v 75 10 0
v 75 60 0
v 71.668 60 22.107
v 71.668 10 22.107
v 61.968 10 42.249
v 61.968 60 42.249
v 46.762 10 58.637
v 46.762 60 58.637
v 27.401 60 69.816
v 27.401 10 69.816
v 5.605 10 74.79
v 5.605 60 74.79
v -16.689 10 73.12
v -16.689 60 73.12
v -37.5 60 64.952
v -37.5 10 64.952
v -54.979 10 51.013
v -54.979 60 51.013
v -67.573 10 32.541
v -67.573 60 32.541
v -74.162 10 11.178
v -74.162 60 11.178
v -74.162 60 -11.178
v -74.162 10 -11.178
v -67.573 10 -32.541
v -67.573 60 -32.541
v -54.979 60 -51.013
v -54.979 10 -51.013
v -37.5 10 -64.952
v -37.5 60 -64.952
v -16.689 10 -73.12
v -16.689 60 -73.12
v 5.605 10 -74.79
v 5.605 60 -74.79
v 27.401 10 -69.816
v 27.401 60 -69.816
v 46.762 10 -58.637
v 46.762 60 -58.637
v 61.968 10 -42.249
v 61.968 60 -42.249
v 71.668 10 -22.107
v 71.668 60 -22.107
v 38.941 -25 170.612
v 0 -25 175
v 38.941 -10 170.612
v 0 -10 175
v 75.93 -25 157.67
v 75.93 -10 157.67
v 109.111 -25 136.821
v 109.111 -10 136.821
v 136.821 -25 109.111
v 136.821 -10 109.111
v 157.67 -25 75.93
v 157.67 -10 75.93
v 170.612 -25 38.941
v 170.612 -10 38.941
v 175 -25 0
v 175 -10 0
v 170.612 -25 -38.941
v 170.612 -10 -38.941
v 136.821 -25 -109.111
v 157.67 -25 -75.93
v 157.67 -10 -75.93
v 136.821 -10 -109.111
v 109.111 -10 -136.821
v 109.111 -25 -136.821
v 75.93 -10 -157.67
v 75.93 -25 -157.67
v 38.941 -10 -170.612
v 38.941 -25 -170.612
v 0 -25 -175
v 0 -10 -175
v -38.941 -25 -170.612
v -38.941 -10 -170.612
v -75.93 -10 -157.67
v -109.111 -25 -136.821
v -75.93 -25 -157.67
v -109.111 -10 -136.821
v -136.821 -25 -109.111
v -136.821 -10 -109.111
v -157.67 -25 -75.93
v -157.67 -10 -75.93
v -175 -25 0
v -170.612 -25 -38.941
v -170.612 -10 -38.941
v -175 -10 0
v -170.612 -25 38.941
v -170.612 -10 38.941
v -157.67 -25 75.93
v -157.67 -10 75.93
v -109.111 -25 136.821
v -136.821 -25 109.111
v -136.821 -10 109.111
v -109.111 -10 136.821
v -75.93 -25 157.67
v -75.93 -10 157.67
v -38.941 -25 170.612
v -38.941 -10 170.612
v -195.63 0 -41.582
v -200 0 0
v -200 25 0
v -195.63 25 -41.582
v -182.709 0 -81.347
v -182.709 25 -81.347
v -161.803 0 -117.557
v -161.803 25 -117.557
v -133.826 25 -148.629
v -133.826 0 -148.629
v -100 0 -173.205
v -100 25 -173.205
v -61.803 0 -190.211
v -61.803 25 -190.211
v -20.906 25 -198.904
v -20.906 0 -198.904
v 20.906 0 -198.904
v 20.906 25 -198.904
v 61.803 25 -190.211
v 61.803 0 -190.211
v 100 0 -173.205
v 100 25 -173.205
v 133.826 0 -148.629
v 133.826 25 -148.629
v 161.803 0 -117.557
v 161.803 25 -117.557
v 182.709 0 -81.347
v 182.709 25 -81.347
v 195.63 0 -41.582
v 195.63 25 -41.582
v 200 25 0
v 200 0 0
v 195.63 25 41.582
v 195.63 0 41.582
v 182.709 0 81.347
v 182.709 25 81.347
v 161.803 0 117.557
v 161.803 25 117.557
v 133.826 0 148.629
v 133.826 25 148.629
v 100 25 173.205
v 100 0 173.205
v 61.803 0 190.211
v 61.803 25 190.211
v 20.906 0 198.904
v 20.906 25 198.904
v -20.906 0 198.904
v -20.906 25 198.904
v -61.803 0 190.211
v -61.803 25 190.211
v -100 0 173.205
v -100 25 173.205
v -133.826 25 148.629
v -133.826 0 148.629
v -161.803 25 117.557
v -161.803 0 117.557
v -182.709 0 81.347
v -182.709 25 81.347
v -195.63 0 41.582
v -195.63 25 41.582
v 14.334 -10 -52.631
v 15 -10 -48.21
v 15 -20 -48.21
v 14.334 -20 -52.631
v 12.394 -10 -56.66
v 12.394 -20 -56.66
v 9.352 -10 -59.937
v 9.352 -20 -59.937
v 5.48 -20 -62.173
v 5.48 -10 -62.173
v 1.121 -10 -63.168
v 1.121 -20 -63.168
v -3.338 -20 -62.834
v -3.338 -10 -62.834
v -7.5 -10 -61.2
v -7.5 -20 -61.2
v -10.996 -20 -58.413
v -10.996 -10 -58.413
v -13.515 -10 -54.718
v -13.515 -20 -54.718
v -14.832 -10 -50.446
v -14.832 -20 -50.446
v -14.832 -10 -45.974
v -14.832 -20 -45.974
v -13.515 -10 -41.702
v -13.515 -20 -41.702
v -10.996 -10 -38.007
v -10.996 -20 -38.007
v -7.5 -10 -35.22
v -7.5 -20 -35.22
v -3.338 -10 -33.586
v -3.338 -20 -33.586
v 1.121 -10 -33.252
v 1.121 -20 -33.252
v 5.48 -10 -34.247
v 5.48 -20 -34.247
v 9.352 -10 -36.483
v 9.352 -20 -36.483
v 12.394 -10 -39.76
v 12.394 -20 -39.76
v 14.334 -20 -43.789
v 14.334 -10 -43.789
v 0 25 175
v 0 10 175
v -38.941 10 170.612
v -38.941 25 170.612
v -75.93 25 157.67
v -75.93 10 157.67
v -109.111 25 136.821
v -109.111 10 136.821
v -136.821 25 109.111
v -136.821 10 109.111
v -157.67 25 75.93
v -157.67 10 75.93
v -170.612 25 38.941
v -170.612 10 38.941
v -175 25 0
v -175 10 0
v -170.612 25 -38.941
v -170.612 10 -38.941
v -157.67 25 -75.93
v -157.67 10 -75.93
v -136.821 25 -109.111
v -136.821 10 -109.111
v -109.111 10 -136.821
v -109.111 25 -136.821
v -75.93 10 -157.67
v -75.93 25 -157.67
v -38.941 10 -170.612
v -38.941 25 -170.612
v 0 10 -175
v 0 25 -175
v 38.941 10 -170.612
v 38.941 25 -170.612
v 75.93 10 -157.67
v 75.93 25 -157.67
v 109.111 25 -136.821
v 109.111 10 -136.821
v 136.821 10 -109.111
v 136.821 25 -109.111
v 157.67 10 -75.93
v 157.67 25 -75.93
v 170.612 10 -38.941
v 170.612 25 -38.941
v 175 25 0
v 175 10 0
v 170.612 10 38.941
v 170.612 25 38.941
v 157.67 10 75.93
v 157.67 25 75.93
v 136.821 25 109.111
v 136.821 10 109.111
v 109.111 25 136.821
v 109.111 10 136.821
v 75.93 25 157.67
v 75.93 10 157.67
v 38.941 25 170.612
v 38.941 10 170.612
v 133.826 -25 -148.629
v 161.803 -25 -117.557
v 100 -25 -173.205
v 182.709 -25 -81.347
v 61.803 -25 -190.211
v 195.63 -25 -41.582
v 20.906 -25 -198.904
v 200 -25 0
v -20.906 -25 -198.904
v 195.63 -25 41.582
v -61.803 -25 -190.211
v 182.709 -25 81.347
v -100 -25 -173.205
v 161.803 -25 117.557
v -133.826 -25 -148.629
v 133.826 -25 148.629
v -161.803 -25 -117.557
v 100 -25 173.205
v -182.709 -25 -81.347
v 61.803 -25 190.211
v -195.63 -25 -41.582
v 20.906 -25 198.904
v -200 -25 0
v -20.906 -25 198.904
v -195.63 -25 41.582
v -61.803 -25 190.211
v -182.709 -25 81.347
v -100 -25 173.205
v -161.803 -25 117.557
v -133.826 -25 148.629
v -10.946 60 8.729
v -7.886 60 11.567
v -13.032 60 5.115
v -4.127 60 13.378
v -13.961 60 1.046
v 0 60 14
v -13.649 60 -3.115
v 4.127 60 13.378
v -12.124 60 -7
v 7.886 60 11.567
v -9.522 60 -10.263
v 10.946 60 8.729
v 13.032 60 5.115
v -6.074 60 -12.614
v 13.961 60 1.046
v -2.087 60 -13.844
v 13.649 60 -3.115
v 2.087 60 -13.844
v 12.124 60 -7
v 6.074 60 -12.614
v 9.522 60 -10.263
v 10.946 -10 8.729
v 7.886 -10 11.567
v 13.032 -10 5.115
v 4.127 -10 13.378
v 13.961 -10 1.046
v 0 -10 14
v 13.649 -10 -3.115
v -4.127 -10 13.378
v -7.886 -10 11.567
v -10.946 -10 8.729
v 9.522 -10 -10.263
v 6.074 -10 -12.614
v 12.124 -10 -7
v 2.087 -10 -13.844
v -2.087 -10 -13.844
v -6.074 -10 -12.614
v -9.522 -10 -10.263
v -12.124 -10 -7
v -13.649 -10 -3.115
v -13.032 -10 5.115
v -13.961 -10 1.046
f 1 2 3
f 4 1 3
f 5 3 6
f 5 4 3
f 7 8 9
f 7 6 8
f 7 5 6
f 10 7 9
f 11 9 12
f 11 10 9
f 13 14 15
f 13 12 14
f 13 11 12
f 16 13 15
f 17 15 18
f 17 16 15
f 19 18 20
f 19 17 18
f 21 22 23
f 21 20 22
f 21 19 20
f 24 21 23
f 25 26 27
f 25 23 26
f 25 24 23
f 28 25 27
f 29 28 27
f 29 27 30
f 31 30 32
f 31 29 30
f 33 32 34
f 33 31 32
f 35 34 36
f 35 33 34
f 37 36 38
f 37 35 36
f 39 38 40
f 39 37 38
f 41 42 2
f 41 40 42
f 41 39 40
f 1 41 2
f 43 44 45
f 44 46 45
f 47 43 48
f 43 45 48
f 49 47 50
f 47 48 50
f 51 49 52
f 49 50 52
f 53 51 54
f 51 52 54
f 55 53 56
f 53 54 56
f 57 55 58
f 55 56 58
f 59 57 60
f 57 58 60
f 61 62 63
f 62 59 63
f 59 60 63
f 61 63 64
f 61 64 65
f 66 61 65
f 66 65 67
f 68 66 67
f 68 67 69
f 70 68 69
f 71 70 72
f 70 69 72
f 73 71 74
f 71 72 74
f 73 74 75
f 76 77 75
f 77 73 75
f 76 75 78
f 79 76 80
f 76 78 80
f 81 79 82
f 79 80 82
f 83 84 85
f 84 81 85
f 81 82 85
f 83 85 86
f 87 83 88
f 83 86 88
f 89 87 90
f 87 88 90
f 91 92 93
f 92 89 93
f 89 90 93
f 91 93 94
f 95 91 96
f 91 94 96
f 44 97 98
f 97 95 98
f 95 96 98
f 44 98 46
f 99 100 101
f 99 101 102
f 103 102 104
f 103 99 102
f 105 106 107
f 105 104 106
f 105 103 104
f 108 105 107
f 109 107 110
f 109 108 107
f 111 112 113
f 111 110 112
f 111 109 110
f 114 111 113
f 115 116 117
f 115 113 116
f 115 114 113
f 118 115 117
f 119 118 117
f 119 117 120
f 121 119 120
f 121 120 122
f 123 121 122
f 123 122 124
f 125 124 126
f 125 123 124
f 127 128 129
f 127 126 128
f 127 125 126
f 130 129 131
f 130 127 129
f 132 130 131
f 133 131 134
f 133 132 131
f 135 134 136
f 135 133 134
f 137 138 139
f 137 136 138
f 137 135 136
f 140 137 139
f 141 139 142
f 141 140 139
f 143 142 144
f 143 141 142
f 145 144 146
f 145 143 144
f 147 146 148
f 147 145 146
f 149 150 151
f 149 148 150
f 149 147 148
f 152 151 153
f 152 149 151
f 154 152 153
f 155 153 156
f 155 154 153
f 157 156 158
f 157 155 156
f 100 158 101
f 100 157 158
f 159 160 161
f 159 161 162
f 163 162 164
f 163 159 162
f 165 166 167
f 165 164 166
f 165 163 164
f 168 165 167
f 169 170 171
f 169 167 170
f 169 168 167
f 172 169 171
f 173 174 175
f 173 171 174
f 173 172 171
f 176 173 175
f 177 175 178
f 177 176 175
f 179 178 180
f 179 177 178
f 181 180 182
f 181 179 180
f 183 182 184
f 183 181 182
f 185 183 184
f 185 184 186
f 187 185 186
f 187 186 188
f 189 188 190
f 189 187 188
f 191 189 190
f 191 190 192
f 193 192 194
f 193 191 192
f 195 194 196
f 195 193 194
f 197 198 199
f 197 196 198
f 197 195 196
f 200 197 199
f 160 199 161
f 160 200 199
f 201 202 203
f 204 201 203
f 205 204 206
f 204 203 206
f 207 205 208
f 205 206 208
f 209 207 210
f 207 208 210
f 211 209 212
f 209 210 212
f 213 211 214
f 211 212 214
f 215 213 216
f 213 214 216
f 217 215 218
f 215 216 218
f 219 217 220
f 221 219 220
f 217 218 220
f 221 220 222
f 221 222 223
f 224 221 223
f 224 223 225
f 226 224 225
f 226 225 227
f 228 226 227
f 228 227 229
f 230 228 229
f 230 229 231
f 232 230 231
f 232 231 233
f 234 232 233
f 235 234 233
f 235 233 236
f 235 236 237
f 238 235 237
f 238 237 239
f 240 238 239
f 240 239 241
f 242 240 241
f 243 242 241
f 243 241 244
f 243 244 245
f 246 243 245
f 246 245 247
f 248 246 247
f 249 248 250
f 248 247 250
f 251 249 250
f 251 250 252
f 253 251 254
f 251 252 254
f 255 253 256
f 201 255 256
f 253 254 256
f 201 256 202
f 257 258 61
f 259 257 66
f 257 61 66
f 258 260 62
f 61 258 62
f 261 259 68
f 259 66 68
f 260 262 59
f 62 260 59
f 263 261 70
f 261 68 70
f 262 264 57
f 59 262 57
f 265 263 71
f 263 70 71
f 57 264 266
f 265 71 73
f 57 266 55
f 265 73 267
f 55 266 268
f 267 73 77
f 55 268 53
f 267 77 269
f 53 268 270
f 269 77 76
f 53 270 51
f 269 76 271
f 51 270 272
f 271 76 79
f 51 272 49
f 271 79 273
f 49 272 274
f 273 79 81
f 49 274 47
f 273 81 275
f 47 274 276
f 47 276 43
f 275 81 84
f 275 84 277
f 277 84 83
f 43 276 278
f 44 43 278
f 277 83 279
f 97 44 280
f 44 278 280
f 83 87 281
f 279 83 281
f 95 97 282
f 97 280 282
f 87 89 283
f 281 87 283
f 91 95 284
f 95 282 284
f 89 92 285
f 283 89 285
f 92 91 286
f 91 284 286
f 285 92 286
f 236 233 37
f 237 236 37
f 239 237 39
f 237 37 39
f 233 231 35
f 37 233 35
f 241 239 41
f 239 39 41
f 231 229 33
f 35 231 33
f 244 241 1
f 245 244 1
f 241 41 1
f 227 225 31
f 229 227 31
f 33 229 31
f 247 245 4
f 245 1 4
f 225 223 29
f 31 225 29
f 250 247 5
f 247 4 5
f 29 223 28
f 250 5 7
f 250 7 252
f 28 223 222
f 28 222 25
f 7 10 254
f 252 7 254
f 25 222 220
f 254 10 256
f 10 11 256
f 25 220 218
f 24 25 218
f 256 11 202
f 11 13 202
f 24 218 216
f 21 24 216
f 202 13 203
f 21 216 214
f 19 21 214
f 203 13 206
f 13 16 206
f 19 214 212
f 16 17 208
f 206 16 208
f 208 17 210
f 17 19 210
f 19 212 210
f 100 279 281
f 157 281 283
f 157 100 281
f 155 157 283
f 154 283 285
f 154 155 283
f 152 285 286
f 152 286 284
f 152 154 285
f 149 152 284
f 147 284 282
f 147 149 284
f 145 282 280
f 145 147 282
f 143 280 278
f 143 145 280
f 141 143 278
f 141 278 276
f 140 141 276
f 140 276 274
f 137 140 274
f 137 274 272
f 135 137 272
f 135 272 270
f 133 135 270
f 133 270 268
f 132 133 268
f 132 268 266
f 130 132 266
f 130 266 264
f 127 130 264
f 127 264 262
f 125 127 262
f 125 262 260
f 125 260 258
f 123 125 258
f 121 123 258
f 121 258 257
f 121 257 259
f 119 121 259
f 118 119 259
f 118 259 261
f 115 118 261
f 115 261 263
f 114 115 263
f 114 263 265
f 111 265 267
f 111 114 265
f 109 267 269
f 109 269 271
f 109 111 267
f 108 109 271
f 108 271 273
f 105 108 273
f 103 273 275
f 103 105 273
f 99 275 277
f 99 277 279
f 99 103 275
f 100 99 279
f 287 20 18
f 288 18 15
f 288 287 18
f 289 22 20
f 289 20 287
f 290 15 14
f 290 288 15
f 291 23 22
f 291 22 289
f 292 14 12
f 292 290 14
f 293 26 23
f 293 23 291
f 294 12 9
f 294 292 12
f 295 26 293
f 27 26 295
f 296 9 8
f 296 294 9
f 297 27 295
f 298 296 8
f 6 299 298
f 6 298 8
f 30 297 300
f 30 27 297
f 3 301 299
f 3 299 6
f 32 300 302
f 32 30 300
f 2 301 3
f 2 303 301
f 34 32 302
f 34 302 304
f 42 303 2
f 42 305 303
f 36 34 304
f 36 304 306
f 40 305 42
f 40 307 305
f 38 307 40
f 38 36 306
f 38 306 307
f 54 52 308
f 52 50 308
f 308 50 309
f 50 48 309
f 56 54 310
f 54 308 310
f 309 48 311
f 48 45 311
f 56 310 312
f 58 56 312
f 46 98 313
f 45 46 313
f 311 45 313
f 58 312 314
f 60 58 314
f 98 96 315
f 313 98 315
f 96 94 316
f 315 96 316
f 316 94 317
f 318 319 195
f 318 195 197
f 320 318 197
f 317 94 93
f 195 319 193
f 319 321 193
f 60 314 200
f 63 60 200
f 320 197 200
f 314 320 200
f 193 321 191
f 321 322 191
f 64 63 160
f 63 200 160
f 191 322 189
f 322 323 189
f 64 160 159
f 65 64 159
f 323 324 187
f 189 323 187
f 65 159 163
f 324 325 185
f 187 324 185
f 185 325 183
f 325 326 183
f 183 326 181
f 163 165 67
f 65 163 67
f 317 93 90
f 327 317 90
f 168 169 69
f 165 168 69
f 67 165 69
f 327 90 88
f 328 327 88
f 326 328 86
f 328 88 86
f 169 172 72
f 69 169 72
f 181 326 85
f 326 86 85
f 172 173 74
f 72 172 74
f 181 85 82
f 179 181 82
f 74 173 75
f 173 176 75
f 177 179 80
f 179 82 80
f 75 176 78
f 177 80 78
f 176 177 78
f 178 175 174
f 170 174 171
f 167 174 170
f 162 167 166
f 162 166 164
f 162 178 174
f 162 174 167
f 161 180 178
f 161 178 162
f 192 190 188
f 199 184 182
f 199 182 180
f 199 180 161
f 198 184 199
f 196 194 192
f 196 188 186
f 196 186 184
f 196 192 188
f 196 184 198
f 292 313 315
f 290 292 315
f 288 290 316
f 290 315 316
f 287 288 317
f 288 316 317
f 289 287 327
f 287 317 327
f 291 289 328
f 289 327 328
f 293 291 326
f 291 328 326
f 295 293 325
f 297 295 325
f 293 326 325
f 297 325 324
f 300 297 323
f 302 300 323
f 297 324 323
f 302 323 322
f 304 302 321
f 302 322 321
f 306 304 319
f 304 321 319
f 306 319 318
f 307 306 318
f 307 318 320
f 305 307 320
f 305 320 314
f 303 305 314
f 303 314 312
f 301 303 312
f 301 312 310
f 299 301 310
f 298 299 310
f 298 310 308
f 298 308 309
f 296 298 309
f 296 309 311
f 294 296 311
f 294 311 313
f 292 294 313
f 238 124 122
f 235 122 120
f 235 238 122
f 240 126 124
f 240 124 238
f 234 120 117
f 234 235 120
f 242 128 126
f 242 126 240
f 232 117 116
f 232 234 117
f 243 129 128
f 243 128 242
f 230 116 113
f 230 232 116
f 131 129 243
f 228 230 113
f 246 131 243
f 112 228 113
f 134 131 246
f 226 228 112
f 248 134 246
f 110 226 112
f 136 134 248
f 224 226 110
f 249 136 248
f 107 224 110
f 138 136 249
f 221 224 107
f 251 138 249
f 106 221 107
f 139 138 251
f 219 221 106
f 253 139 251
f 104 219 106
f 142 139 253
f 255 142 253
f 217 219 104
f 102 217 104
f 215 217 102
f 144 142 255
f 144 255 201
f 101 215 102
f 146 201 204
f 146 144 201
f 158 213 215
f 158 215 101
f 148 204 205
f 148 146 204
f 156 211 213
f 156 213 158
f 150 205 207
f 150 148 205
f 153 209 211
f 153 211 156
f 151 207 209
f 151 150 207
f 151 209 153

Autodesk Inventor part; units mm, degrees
ref_plane "YZ Plane" through (0, 0, 0) normal (1, 0, 0) x (0, 1, 0)
ref_plane "XZ Plane" through (0, 0, 0) normal (0, 1, 0) x (-1, 0, 0)
ref_plane "XY Plane" through (0, 0, 0) normal (0, 0, 1) x (1, 0, 0)
sketch "Skizze1" plane through (0, 0, 0) normal (0, 1, 0) x (-1, 0, 0)
  circle A0 centre (0, 0) radius 200
  dimension "d0" = 400
extrude "Extrusion1" add sketch "Skizze1" along normal mid plane 50
sketch "Skizze2" plane through (0, 25, 0) normal (0, 1, 0) x (1, 0, 0)
  circle A0 centre (0, 0) radius 200 projected
hole "Bohrung1" at (0, 25, 0) direction (0, -1, 0) diameter 350 depth 15
mirror "Spiegeln1" about plane through (0, 0, 0) normal (0, 1, 0) of "Bohrung1"
sketch "Skizze3" plane through (0, 10, 0) normal (0, 1, 0) x (1, 0, 0)
  circle A0 centre (0, 0) radius 75
  dimension "d11" = 150
extrude "Extrusion2" add sketch "Skizze3" along normal blind 50
sketch "Skizze4" plane through (0, 60, 0) normal (0, 1, 0) x (1, 0, 0)
  circle A0 centre (0, 0) radius 75 projected
hole "Bohrung2" at (0, 60, 0) direction (0, -1, 0) diameter 28 depth 70
sketch "Skizze7" plane through (0, -10, 0) normal (0, -1, 0) x (1, 0, 0)
  circle A0 centre (0, -48.21) radius 15
  point P0 (0, 0)
  dimension "d46" = 30
  dimension "d50" = 48.21
extrude "Extrusion3" add sketch "Skizze7" along normal blind 10
properties part number "rad" material "Gold"
